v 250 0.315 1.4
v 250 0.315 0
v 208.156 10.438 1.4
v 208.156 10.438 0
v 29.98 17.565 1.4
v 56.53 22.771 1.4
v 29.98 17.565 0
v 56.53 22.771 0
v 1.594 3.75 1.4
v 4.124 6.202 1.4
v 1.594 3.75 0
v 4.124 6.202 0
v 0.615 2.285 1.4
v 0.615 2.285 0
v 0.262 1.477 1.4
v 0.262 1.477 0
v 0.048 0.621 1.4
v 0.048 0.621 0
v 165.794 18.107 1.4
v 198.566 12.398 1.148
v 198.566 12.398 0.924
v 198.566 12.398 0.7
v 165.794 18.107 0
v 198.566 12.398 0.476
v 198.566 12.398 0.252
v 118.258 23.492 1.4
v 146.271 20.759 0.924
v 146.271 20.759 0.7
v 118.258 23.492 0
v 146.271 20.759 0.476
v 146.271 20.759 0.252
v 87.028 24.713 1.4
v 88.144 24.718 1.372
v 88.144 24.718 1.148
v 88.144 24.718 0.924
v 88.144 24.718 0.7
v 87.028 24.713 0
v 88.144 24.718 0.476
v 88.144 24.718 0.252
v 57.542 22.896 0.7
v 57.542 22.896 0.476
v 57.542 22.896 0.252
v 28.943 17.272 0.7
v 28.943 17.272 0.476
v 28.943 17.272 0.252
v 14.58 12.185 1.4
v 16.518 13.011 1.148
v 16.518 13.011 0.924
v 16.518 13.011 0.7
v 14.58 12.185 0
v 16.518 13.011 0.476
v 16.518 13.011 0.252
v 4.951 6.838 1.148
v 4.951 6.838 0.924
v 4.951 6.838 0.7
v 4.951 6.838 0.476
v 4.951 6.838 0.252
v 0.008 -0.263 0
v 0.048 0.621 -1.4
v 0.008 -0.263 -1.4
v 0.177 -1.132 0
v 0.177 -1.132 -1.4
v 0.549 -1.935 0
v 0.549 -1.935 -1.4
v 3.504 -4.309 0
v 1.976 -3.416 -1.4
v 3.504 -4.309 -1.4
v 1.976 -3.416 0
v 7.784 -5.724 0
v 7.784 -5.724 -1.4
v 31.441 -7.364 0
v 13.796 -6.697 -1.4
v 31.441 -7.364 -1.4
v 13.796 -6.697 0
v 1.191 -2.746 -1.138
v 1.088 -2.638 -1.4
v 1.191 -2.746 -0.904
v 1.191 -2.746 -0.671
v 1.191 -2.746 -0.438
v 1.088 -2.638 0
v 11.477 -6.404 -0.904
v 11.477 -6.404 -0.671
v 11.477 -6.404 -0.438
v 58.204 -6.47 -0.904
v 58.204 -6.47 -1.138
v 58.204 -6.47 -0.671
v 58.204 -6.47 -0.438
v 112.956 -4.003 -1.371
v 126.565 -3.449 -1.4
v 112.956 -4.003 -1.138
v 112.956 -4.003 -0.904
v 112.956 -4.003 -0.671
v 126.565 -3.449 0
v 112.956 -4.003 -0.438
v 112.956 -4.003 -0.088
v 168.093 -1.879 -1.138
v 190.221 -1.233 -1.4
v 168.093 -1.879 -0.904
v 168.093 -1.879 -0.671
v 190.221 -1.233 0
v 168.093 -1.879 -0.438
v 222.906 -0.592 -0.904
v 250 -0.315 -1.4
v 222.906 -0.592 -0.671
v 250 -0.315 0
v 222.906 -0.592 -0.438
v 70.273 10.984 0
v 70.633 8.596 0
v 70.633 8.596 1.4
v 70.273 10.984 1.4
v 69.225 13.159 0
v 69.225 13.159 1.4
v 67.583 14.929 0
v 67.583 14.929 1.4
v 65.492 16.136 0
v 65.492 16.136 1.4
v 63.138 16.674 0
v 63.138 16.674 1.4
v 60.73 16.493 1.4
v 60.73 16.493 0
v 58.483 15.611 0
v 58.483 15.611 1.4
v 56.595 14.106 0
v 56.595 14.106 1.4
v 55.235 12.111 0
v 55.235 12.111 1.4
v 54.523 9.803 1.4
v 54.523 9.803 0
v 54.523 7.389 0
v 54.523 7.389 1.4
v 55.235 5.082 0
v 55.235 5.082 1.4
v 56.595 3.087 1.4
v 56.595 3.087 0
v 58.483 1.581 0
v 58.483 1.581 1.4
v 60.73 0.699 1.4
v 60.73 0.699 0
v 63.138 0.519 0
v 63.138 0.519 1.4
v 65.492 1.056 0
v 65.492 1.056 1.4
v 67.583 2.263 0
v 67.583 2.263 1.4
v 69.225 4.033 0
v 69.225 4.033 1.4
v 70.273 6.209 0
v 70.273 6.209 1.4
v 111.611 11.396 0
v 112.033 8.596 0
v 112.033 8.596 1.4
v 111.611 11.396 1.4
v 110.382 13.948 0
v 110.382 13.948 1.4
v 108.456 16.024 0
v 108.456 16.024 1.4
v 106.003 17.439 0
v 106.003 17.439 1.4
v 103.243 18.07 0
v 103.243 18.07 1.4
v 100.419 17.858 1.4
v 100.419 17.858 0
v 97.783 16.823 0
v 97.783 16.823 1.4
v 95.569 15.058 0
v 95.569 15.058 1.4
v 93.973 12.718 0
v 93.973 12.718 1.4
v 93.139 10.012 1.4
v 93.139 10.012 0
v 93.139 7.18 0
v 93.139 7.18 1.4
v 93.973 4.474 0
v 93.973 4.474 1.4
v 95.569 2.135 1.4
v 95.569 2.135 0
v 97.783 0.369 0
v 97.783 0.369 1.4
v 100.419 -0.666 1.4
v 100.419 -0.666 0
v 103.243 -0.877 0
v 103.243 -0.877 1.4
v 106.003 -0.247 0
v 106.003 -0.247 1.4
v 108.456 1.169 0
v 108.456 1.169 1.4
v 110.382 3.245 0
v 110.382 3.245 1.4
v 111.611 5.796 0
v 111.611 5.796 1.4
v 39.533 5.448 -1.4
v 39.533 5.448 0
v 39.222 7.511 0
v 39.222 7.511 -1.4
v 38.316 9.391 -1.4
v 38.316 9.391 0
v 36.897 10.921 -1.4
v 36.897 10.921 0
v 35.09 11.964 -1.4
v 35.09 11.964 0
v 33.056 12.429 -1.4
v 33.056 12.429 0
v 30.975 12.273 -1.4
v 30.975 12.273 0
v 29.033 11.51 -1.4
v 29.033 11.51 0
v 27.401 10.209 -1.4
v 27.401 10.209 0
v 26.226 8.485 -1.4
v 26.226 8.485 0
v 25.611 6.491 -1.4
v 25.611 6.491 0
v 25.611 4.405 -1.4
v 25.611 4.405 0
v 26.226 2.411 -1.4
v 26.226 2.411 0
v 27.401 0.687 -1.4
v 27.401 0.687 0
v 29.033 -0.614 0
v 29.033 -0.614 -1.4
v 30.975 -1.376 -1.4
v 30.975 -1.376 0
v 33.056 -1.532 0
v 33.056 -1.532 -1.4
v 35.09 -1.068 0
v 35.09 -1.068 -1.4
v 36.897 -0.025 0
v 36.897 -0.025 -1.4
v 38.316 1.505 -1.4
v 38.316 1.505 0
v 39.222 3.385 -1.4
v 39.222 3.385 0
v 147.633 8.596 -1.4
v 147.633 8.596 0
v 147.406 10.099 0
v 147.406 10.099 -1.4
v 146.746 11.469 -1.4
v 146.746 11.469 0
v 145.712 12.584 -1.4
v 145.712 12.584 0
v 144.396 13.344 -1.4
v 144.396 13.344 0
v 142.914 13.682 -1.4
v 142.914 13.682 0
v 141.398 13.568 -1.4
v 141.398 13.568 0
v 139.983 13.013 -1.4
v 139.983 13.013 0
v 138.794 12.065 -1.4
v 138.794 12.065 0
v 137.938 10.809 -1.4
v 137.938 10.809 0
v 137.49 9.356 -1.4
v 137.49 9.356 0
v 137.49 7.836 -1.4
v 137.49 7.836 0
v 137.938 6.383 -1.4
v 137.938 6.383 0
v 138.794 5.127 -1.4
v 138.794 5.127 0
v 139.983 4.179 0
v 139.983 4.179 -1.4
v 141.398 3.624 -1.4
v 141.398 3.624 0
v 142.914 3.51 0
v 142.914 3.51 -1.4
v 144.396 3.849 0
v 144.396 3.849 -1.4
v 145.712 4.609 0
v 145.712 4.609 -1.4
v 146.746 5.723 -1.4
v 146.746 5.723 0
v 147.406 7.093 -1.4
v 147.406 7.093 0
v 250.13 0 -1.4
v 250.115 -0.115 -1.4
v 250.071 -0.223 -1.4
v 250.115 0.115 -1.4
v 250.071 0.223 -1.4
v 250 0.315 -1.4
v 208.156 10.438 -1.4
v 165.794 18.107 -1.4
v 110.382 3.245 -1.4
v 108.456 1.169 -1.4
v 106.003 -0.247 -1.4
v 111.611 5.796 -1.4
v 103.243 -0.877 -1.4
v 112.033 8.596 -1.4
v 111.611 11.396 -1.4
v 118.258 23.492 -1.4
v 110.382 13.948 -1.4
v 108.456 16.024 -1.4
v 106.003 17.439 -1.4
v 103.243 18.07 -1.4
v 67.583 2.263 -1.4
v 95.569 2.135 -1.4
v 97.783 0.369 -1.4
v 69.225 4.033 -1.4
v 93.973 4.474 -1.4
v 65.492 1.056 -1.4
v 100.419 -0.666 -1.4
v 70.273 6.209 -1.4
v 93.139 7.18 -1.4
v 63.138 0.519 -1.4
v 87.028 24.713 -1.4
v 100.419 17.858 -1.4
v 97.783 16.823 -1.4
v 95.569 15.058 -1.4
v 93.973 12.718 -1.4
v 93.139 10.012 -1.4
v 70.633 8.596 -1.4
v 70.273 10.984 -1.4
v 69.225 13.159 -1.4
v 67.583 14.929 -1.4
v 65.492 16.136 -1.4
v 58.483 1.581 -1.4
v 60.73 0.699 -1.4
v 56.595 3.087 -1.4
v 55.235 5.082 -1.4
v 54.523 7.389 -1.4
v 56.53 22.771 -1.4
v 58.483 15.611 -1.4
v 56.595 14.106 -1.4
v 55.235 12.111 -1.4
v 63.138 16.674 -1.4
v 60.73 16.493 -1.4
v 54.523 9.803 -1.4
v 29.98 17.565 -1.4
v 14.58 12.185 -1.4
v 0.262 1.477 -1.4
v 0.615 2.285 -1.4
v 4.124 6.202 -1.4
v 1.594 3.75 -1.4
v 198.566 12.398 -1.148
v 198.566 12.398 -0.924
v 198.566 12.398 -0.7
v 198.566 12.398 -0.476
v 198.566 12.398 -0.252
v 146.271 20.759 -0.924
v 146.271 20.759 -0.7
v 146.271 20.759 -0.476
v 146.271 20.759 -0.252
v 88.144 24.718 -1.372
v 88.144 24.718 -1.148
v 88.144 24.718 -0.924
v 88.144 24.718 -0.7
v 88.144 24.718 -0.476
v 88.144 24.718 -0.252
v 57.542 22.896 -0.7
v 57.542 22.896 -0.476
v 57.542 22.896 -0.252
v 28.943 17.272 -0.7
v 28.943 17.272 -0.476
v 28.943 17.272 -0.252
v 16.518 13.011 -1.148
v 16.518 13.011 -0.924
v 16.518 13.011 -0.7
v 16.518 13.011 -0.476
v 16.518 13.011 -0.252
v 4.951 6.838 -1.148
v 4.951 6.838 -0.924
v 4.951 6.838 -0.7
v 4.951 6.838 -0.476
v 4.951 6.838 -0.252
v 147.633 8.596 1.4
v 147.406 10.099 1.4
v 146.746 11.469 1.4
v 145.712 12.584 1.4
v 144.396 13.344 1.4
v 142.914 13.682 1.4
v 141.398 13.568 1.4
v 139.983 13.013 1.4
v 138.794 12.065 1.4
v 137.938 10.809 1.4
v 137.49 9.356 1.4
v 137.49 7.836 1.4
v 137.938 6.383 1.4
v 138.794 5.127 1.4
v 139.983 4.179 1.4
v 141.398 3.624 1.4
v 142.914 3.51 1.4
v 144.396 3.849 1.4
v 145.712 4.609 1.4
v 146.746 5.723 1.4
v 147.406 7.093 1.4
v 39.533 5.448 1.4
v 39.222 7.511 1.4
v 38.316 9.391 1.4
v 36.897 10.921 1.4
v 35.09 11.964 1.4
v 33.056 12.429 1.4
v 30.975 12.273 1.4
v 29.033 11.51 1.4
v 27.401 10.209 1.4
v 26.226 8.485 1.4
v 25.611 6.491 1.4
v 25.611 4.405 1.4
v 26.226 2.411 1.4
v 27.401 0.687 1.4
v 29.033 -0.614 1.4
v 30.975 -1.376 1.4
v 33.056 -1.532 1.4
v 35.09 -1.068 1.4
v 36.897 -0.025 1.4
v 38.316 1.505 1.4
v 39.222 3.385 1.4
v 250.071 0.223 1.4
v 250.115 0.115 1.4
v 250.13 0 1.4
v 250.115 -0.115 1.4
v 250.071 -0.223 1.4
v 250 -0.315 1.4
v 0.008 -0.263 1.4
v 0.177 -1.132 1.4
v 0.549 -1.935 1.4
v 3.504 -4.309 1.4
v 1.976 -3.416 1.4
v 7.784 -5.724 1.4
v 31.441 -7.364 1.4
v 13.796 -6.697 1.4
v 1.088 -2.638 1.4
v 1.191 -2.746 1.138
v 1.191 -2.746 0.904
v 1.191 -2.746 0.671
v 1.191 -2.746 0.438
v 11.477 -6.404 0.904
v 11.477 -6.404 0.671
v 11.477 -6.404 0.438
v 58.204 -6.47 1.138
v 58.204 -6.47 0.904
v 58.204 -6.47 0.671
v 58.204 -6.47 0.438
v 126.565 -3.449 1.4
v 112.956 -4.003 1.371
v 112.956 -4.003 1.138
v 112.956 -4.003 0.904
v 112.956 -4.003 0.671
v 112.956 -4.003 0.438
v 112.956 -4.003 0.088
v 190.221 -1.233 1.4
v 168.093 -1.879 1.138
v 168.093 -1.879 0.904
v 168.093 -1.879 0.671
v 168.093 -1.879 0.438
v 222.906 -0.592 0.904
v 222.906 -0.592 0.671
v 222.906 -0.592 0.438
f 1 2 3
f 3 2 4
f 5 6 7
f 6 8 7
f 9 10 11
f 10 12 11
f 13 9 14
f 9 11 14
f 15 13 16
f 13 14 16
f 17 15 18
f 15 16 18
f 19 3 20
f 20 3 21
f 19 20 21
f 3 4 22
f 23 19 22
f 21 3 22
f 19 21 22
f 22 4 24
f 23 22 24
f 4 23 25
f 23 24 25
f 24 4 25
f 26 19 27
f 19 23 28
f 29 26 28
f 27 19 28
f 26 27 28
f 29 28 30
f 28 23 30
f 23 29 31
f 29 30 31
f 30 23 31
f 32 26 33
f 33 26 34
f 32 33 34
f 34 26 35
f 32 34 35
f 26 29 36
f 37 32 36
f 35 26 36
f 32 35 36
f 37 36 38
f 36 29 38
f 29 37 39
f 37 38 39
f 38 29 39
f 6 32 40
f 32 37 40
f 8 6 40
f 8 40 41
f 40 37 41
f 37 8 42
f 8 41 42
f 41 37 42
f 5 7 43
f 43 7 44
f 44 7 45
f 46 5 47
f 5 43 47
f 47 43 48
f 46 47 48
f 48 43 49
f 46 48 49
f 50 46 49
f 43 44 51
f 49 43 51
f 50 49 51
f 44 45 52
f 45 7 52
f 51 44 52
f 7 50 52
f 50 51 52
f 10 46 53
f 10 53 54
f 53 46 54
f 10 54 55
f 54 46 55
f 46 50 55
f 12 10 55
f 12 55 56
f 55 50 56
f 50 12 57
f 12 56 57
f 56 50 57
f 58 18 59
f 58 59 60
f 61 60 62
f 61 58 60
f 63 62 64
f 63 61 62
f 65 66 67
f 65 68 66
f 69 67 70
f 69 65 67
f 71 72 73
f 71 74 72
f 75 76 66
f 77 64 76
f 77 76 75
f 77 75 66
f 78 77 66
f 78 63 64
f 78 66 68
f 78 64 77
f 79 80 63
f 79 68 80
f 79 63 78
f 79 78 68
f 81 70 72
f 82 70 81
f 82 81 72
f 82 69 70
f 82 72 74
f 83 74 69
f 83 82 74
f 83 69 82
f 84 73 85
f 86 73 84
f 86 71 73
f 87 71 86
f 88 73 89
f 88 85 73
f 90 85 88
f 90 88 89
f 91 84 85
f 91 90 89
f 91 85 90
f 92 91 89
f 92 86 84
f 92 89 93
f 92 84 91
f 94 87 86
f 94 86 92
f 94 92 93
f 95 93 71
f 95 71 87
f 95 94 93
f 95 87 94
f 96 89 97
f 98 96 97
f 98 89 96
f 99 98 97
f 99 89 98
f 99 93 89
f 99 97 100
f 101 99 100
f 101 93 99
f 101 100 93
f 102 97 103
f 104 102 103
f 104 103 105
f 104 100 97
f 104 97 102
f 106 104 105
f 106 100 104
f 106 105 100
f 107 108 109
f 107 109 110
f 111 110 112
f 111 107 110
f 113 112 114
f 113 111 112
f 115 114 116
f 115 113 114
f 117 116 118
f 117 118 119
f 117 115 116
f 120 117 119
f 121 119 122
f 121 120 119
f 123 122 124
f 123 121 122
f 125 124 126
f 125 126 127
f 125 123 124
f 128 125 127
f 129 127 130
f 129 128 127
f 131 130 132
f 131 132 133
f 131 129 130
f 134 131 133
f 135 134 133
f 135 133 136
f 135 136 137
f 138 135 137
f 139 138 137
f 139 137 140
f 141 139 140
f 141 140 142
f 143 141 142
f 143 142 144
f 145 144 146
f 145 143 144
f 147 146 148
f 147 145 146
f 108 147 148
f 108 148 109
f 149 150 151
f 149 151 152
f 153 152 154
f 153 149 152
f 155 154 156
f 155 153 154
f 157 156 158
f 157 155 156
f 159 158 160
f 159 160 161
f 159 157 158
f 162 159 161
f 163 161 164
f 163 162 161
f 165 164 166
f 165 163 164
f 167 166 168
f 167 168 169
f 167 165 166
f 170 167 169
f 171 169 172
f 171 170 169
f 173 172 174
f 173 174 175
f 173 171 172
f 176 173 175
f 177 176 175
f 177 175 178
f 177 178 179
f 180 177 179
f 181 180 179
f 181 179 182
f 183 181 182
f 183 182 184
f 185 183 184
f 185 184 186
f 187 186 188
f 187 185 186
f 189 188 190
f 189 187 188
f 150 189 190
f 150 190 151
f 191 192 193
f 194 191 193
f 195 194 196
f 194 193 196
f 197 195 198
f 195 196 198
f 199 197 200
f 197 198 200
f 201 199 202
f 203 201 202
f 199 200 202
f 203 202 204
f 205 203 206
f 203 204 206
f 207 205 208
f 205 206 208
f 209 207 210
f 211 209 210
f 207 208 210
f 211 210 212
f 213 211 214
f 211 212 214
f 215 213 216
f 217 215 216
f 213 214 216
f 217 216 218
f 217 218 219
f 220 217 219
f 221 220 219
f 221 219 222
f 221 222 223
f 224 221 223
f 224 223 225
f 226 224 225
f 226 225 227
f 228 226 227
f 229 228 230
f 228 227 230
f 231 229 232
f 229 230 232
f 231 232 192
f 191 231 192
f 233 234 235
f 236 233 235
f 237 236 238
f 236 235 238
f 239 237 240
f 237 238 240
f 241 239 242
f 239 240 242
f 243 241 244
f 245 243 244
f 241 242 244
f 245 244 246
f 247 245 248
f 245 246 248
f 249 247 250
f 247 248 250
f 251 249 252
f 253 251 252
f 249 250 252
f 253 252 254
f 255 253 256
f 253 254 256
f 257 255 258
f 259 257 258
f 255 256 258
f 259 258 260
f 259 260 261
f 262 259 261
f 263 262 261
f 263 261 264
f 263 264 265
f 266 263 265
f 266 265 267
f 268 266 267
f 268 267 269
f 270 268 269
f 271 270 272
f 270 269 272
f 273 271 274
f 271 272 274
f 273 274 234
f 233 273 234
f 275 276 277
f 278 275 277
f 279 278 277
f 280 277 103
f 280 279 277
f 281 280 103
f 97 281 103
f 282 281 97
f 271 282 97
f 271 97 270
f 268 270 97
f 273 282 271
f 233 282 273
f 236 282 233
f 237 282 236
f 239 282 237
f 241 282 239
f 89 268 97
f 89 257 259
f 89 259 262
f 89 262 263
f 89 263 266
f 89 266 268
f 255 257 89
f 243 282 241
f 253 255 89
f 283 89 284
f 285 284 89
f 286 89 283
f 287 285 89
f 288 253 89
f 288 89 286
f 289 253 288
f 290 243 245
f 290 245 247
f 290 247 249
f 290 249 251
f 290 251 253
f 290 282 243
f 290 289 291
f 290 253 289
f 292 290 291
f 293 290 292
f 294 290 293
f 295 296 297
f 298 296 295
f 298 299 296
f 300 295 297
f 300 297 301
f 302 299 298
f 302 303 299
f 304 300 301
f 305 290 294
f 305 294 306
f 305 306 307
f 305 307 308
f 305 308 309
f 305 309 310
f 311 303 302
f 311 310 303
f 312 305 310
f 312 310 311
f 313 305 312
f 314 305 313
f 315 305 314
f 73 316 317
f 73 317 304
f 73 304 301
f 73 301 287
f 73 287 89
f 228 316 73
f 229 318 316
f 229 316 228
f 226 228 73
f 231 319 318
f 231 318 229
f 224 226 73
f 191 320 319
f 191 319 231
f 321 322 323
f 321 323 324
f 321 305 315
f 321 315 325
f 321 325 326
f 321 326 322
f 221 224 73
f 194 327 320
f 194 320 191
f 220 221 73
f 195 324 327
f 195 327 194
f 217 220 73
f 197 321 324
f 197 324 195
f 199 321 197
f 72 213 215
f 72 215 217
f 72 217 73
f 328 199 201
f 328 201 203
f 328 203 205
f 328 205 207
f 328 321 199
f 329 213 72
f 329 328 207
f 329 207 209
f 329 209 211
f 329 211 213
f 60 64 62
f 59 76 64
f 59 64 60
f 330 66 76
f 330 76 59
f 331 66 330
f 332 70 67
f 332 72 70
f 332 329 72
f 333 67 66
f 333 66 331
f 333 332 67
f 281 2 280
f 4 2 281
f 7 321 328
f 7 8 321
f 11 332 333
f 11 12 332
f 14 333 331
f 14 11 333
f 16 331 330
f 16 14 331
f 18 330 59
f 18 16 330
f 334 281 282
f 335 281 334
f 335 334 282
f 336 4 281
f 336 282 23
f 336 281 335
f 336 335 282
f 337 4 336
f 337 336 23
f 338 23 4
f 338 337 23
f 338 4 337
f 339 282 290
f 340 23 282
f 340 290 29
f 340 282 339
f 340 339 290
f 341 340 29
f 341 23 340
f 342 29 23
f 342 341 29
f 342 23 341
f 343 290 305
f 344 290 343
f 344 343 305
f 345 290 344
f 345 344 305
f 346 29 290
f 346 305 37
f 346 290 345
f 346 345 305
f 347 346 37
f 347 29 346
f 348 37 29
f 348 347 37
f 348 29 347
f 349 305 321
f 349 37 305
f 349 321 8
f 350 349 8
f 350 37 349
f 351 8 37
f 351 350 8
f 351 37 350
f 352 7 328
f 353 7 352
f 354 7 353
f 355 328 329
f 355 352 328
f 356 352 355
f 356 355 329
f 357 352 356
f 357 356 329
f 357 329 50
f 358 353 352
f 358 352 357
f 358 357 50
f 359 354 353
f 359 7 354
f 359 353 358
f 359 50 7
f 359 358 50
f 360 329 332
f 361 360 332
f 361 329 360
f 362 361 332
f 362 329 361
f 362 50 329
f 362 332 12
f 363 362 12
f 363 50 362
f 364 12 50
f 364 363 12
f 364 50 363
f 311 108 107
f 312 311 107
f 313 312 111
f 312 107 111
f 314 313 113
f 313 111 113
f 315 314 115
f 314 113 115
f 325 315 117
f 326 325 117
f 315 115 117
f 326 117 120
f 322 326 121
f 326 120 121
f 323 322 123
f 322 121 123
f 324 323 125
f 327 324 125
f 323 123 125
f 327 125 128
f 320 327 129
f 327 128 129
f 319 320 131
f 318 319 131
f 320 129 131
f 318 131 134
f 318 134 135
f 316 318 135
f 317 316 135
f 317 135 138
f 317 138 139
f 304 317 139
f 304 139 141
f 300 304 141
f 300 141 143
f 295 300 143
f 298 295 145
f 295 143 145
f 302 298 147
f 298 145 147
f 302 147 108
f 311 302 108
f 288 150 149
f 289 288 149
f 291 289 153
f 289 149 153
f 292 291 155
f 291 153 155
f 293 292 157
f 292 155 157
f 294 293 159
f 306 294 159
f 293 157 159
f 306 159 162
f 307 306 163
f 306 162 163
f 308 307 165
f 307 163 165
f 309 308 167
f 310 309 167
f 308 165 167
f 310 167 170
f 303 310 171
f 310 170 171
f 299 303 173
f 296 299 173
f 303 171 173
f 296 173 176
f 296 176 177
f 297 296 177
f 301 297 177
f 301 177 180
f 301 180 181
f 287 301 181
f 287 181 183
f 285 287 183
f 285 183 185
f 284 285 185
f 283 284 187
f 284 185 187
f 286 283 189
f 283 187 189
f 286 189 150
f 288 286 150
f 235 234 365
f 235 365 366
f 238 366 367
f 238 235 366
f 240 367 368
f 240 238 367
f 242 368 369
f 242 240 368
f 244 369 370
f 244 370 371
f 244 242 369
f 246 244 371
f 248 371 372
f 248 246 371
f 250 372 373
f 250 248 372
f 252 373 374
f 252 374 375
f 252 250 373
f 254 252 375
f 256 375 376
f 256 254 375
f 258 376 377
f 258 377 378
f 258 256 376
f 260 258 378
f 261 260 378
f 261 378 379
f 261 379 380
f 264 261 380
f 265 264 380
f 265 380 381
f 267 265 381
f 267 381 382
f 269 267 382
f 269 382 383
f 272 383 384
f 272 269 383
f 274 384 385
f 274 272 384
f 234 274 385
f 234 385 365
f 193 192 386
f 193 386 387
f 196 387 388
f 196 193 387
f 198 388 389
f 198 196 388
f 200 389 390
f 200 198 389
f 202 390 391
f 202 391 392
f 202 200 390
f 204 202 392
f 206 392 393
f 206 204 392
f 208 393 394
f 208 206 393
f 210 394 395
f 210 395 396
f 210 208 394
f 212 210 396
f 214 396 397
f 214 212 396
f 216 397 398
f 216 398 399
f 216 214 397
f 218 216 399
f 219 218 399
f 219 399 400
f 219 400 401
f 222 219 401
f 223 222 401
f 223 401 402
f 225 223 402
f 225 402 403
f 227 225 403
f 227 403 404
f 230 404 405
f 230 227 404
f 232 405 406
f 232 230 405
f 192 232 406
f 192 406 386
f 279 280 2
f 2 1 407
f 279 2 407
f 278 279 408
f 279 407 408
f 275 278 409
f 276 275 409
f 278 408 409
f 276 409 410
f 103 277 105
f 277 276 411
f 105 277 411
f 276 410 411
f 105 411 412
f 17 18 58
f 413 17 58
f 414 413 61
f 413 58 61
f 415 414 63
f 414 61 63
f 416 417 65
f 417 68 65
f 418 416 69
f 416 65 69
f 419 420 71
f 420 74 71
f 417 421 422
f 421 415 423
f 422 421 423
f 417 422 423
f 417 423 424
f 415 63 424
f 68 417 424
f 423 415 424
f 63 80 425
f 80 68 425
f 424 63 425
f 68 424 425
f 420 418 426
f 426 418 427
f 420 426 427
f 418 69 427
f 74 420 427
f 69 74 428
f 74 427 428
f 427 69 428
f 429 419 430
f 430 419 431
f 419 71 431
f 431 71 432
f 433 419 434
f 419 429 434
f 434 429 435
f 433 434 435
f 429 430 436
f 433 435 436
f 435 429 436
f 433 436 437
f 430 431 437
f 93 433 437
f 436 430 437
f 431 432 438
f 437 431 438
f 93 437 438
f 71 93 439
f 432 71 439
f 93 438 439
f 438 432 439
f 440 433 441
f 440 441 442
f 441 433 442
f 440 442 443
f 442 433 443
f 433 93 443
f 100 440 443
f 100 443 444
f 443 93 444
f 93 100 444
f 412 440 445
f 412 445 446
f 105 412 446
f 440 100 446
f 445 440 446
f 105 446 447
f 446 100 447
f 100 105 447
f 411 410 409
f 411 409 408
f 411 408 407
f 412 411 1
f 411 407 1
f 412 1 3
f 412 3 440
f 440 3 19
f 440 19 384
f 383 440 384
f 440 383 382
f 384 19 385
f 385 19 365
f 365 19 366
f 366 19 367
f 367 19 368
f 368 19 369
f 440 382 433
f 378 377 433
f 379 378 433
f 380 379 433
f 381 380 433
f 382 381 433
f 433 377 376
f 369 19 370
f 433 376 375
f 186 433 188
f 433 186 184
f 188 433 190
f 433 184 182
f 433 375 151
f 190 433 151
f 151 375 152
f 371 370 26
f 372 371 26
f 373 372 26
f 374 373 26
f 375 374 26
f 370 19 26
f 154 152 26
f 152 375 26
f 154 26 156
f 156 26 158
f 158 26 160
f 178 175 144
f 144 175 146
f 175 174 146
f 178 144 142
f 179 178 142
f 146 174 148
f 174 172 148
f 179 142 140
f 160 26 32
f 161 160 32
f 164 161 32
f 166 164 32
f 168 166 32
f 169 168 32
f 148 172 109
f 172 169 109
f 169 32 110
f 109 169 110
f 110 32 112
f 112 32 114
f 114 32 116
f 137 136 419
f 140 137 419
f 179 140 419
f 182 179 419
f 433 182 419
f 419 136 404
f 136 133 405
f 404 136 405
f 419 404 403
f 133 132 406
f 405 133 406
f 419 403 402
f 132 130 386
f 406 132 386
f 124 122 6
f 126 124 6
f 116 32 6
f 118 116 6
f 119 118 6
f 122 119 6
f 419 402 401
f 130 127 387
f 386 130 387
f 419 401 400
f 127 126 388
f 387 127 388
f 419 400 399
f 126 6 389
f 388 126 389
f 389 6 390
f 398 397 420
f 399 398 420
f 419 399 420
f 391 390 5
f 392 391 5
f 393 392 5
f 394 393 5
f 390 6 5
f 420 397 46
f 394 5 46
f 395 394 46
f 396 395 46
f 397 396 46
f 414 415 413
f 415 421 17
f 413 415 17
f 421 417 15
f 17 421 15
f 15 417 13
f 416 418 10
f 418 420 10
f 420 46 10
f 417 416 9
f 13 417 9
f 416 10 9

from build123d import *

# Parameters (mm, degrees)
SKETCH_1_R      = 8.1
SKETCH_1_R_2    = 5.1
SKETCH_1_R_3    = 7
SKETCH_1_R_4    = 9.5
EXTRUDE_1_DEPTH = 1.4


with BuildPart() as part:
    # Эскиз1 → Бобышка-Вытянуть1 (new body, symmetric)
    with BuildSketch(Plane.XY):
        with BuildLine():
            ThreePointArc((250, 0.315), (250.130477272, 0), (250, -0.315))
            add(Edge.make_bspline(
                [(0.047975, 0.621425), (0.02271382, 0.373490086), (-0.027820789, -0.122499975), (0.077991212, -0.88443459), (0.34969565, -1.63883807), (0.814331135, -2.365068924), (1.46348078, -3.039275245), (2.290973017, -3.66099947), (3.30592875, -4.235779621), (4.535255619, -4.773674144), (6.029745688, -5.282192165), (7.868981215, -5.765316676), (10.168831392, -6.221716593), (13.075438189, -6.639618731), (16.728115363, -6.992956738), (21.189952096, -7.247345145), (26.399984416, -7.376638849), (32.197398564, -7.376256913), (38.397806759, -7.26143658), (44.857621768, -7.056641358), (51.486543096, -6.786453532), (58.230980932, -6.472324587), (65.052094606, -6.132852265), (71.910772709, -5.784005177), (78.771375576, -5.439680454), (85.61049861, -5.110951253), (92.43210759, -4.804953326), (99.25503119, -4.531981655), (106.097378405, -4.278274671), (112.96921168, -4.003089926), (119.864404255, -3.723176184), (126.773860473, -3.440067296), (133.681563213, -3.1586956), (140.581870407, -2.88238072), (147.472013762, -2.613922958), (154.352602411, -2.355626415), (161.225044134, -2.109369921), (168.090869746, -1.876634074), (174.951578522, -1.658643104), (181.808595966, -1.456378123), (188.663234462, -1.270383377), (195.516645168, -1.101112884), (202.369532894, -0.948617189), (211.49919029, -0.767742353), (220.603098666, -0.619939742), (229.617630172, -0.50292618), (236.087353854, -0.431514192), (241.980776913, -0.376520461), (246.558970011, -0.339535886), (249.120490965, -0.321271242), (250, -0.315)],
                knots=[0, 0, 0, 0, 0.002941446, 0.005884319, 0.00901613, 0.012364547, 0.016007934, 0.020036845, 0.024573728, 0.029783835, 0.03589701, 0.04324044, 0.052275965, 0.063634589, 0.077983176, 0.095698161, 0.116520086, 0.13966073, 0.16431217, 0.18991889, 0.216157201, 0.242837762, 0.269833583, 0.296993022, 0.324123272, 0.351139107, 0.378035509, 0.404946016, 0.431960837, 0.459078395, 0.4863474, 0.51364083, 0.540928595, 0.568176028, 0.595379569, 0.622543445, 0.64967326, 0.676775201, 0.703855228, 0.730918775, 0.757971338, 0.785017763, 0.812061651, 0.839103366, 0.893099152, 0.919831065, 0.945809917, 0.969680601, 0.989589706, 1, 1, 1, 1], degree=3))
            add(Edge.make_bspline(
                [(250, 0.315), (249.15566774, 0.545019818), (246.720175698, 1.208516243), (242.391332083, 2.358339053), (236.849761204, 3.787625364), (230.779918279, 5.298008837), (224.455917947, 6.812866028), (218.030543496, 8.291610632), (211.562405045, 9.719735057), (205.072411509, 11.092374932), (198.567970913, 12.407850726), (192.052369914, 13.665297924), (185.527619973, 14.864093303), (178.995338991, 16.003404779), (172.457064741, 17.082388115), (165.914317095, 18.099827841), (159.368680729, 19.054501815), (152.821805128, 19.944885603), (146.275439401, 20.769282183), (139.731359791, 21.525676113), (133.19183673, 22.212004249), (126.658683026, 22.825721429), (120.136770918, 23.363973266), (113.628567141, 23.824677324), (107.152732037, 24.200242594), (100.741095693, 24.49839951), (94.411752715, 24.686649768), (88.155917993, 24.74009565), (81.949043055, 24.658849144), (75.780520592, 24.441013808), (69.653692942, 24.081884821), (63.575410502, 23.578006361), (57.555189551, 22.924946658), (51.605762688, 22.119065522), (45.744400311, 21.156564432), (39.995857594, 20.03537139), (34.397919842, 18.756316234), (29.010382104, 17.327615608), (23.925798408, 15.771864921), (19.27067884, 14.134269434), (15.179098391, 12.483335438), (11.74047579, 10.895610995), (8.959371869, 9.429577365), (6.76089118, 8.108603199), (5.033709748, 6.924638055), (3.671694933, 5.854229664), (2.592101123, 4.871305369), (1.738175669, 3.952595743), (1.06987083, 3.080946373), (0.57164541, 2.241622102), (0.215773899, 1.430785397), (0.102255582, 0.883241695), (0.047975, 0.621425)],
                knots=[0, 0, 0, 0, 0.0101622, 0.029313053, 0.052011605, 0.076619468, 0.101948061, 0.127526132, 0.153184131, 0.178867888, 0.204557903, 0.230245712, 0.255925967, 0.281594302, 0.30724642, 0.332878042, 0.358484538, 0.384061186, 0.409602822, 0.435103874, 0.460559416, 0.485959195, 0.51130307, 0.536551515, 0.561723366, 0.586628867, 0.611085431, 0.6352512, 0.659272176, 0.683163753, 0.706922144, 0.73053591, 0.7539832, 0.77723469, 0.800246382, 0.822950709, 0.845237155, 0.866915896, 0.887662335, 0.906968281, 0.924203157, 0.938878975, 0.950931611, 0.960693484, 0.968646729, 0.975232933, 0.980794744, 0.985583761, 0.989781539, 0.993521313, 0.996902113, 1, 1, 1, 1], degree=3))
        make_face()
        with Locations((62.532619318, 8.596197208)):
            Circle(SKETCH_1_R, mode=Mode.SUBTRACT)
        with Locations((142.532619318, 8.596197208)):
            Circle(SKETCH_1_R_2, mode=Mode.SUBTRACT)
        with Locations((32.532619318, 5.448144701)):
            Circle(SKETCH_1_R_3, mode=Mode.SUBTRACT)
        with Locations((102.532619318, 8.596197208)):
            Circle(SKETCH_1_R_4, mode=Mode.SUBTRACT)
    extrude(amount=EXTRUDE_1_DEPTH, both=True)


solid = part.part
